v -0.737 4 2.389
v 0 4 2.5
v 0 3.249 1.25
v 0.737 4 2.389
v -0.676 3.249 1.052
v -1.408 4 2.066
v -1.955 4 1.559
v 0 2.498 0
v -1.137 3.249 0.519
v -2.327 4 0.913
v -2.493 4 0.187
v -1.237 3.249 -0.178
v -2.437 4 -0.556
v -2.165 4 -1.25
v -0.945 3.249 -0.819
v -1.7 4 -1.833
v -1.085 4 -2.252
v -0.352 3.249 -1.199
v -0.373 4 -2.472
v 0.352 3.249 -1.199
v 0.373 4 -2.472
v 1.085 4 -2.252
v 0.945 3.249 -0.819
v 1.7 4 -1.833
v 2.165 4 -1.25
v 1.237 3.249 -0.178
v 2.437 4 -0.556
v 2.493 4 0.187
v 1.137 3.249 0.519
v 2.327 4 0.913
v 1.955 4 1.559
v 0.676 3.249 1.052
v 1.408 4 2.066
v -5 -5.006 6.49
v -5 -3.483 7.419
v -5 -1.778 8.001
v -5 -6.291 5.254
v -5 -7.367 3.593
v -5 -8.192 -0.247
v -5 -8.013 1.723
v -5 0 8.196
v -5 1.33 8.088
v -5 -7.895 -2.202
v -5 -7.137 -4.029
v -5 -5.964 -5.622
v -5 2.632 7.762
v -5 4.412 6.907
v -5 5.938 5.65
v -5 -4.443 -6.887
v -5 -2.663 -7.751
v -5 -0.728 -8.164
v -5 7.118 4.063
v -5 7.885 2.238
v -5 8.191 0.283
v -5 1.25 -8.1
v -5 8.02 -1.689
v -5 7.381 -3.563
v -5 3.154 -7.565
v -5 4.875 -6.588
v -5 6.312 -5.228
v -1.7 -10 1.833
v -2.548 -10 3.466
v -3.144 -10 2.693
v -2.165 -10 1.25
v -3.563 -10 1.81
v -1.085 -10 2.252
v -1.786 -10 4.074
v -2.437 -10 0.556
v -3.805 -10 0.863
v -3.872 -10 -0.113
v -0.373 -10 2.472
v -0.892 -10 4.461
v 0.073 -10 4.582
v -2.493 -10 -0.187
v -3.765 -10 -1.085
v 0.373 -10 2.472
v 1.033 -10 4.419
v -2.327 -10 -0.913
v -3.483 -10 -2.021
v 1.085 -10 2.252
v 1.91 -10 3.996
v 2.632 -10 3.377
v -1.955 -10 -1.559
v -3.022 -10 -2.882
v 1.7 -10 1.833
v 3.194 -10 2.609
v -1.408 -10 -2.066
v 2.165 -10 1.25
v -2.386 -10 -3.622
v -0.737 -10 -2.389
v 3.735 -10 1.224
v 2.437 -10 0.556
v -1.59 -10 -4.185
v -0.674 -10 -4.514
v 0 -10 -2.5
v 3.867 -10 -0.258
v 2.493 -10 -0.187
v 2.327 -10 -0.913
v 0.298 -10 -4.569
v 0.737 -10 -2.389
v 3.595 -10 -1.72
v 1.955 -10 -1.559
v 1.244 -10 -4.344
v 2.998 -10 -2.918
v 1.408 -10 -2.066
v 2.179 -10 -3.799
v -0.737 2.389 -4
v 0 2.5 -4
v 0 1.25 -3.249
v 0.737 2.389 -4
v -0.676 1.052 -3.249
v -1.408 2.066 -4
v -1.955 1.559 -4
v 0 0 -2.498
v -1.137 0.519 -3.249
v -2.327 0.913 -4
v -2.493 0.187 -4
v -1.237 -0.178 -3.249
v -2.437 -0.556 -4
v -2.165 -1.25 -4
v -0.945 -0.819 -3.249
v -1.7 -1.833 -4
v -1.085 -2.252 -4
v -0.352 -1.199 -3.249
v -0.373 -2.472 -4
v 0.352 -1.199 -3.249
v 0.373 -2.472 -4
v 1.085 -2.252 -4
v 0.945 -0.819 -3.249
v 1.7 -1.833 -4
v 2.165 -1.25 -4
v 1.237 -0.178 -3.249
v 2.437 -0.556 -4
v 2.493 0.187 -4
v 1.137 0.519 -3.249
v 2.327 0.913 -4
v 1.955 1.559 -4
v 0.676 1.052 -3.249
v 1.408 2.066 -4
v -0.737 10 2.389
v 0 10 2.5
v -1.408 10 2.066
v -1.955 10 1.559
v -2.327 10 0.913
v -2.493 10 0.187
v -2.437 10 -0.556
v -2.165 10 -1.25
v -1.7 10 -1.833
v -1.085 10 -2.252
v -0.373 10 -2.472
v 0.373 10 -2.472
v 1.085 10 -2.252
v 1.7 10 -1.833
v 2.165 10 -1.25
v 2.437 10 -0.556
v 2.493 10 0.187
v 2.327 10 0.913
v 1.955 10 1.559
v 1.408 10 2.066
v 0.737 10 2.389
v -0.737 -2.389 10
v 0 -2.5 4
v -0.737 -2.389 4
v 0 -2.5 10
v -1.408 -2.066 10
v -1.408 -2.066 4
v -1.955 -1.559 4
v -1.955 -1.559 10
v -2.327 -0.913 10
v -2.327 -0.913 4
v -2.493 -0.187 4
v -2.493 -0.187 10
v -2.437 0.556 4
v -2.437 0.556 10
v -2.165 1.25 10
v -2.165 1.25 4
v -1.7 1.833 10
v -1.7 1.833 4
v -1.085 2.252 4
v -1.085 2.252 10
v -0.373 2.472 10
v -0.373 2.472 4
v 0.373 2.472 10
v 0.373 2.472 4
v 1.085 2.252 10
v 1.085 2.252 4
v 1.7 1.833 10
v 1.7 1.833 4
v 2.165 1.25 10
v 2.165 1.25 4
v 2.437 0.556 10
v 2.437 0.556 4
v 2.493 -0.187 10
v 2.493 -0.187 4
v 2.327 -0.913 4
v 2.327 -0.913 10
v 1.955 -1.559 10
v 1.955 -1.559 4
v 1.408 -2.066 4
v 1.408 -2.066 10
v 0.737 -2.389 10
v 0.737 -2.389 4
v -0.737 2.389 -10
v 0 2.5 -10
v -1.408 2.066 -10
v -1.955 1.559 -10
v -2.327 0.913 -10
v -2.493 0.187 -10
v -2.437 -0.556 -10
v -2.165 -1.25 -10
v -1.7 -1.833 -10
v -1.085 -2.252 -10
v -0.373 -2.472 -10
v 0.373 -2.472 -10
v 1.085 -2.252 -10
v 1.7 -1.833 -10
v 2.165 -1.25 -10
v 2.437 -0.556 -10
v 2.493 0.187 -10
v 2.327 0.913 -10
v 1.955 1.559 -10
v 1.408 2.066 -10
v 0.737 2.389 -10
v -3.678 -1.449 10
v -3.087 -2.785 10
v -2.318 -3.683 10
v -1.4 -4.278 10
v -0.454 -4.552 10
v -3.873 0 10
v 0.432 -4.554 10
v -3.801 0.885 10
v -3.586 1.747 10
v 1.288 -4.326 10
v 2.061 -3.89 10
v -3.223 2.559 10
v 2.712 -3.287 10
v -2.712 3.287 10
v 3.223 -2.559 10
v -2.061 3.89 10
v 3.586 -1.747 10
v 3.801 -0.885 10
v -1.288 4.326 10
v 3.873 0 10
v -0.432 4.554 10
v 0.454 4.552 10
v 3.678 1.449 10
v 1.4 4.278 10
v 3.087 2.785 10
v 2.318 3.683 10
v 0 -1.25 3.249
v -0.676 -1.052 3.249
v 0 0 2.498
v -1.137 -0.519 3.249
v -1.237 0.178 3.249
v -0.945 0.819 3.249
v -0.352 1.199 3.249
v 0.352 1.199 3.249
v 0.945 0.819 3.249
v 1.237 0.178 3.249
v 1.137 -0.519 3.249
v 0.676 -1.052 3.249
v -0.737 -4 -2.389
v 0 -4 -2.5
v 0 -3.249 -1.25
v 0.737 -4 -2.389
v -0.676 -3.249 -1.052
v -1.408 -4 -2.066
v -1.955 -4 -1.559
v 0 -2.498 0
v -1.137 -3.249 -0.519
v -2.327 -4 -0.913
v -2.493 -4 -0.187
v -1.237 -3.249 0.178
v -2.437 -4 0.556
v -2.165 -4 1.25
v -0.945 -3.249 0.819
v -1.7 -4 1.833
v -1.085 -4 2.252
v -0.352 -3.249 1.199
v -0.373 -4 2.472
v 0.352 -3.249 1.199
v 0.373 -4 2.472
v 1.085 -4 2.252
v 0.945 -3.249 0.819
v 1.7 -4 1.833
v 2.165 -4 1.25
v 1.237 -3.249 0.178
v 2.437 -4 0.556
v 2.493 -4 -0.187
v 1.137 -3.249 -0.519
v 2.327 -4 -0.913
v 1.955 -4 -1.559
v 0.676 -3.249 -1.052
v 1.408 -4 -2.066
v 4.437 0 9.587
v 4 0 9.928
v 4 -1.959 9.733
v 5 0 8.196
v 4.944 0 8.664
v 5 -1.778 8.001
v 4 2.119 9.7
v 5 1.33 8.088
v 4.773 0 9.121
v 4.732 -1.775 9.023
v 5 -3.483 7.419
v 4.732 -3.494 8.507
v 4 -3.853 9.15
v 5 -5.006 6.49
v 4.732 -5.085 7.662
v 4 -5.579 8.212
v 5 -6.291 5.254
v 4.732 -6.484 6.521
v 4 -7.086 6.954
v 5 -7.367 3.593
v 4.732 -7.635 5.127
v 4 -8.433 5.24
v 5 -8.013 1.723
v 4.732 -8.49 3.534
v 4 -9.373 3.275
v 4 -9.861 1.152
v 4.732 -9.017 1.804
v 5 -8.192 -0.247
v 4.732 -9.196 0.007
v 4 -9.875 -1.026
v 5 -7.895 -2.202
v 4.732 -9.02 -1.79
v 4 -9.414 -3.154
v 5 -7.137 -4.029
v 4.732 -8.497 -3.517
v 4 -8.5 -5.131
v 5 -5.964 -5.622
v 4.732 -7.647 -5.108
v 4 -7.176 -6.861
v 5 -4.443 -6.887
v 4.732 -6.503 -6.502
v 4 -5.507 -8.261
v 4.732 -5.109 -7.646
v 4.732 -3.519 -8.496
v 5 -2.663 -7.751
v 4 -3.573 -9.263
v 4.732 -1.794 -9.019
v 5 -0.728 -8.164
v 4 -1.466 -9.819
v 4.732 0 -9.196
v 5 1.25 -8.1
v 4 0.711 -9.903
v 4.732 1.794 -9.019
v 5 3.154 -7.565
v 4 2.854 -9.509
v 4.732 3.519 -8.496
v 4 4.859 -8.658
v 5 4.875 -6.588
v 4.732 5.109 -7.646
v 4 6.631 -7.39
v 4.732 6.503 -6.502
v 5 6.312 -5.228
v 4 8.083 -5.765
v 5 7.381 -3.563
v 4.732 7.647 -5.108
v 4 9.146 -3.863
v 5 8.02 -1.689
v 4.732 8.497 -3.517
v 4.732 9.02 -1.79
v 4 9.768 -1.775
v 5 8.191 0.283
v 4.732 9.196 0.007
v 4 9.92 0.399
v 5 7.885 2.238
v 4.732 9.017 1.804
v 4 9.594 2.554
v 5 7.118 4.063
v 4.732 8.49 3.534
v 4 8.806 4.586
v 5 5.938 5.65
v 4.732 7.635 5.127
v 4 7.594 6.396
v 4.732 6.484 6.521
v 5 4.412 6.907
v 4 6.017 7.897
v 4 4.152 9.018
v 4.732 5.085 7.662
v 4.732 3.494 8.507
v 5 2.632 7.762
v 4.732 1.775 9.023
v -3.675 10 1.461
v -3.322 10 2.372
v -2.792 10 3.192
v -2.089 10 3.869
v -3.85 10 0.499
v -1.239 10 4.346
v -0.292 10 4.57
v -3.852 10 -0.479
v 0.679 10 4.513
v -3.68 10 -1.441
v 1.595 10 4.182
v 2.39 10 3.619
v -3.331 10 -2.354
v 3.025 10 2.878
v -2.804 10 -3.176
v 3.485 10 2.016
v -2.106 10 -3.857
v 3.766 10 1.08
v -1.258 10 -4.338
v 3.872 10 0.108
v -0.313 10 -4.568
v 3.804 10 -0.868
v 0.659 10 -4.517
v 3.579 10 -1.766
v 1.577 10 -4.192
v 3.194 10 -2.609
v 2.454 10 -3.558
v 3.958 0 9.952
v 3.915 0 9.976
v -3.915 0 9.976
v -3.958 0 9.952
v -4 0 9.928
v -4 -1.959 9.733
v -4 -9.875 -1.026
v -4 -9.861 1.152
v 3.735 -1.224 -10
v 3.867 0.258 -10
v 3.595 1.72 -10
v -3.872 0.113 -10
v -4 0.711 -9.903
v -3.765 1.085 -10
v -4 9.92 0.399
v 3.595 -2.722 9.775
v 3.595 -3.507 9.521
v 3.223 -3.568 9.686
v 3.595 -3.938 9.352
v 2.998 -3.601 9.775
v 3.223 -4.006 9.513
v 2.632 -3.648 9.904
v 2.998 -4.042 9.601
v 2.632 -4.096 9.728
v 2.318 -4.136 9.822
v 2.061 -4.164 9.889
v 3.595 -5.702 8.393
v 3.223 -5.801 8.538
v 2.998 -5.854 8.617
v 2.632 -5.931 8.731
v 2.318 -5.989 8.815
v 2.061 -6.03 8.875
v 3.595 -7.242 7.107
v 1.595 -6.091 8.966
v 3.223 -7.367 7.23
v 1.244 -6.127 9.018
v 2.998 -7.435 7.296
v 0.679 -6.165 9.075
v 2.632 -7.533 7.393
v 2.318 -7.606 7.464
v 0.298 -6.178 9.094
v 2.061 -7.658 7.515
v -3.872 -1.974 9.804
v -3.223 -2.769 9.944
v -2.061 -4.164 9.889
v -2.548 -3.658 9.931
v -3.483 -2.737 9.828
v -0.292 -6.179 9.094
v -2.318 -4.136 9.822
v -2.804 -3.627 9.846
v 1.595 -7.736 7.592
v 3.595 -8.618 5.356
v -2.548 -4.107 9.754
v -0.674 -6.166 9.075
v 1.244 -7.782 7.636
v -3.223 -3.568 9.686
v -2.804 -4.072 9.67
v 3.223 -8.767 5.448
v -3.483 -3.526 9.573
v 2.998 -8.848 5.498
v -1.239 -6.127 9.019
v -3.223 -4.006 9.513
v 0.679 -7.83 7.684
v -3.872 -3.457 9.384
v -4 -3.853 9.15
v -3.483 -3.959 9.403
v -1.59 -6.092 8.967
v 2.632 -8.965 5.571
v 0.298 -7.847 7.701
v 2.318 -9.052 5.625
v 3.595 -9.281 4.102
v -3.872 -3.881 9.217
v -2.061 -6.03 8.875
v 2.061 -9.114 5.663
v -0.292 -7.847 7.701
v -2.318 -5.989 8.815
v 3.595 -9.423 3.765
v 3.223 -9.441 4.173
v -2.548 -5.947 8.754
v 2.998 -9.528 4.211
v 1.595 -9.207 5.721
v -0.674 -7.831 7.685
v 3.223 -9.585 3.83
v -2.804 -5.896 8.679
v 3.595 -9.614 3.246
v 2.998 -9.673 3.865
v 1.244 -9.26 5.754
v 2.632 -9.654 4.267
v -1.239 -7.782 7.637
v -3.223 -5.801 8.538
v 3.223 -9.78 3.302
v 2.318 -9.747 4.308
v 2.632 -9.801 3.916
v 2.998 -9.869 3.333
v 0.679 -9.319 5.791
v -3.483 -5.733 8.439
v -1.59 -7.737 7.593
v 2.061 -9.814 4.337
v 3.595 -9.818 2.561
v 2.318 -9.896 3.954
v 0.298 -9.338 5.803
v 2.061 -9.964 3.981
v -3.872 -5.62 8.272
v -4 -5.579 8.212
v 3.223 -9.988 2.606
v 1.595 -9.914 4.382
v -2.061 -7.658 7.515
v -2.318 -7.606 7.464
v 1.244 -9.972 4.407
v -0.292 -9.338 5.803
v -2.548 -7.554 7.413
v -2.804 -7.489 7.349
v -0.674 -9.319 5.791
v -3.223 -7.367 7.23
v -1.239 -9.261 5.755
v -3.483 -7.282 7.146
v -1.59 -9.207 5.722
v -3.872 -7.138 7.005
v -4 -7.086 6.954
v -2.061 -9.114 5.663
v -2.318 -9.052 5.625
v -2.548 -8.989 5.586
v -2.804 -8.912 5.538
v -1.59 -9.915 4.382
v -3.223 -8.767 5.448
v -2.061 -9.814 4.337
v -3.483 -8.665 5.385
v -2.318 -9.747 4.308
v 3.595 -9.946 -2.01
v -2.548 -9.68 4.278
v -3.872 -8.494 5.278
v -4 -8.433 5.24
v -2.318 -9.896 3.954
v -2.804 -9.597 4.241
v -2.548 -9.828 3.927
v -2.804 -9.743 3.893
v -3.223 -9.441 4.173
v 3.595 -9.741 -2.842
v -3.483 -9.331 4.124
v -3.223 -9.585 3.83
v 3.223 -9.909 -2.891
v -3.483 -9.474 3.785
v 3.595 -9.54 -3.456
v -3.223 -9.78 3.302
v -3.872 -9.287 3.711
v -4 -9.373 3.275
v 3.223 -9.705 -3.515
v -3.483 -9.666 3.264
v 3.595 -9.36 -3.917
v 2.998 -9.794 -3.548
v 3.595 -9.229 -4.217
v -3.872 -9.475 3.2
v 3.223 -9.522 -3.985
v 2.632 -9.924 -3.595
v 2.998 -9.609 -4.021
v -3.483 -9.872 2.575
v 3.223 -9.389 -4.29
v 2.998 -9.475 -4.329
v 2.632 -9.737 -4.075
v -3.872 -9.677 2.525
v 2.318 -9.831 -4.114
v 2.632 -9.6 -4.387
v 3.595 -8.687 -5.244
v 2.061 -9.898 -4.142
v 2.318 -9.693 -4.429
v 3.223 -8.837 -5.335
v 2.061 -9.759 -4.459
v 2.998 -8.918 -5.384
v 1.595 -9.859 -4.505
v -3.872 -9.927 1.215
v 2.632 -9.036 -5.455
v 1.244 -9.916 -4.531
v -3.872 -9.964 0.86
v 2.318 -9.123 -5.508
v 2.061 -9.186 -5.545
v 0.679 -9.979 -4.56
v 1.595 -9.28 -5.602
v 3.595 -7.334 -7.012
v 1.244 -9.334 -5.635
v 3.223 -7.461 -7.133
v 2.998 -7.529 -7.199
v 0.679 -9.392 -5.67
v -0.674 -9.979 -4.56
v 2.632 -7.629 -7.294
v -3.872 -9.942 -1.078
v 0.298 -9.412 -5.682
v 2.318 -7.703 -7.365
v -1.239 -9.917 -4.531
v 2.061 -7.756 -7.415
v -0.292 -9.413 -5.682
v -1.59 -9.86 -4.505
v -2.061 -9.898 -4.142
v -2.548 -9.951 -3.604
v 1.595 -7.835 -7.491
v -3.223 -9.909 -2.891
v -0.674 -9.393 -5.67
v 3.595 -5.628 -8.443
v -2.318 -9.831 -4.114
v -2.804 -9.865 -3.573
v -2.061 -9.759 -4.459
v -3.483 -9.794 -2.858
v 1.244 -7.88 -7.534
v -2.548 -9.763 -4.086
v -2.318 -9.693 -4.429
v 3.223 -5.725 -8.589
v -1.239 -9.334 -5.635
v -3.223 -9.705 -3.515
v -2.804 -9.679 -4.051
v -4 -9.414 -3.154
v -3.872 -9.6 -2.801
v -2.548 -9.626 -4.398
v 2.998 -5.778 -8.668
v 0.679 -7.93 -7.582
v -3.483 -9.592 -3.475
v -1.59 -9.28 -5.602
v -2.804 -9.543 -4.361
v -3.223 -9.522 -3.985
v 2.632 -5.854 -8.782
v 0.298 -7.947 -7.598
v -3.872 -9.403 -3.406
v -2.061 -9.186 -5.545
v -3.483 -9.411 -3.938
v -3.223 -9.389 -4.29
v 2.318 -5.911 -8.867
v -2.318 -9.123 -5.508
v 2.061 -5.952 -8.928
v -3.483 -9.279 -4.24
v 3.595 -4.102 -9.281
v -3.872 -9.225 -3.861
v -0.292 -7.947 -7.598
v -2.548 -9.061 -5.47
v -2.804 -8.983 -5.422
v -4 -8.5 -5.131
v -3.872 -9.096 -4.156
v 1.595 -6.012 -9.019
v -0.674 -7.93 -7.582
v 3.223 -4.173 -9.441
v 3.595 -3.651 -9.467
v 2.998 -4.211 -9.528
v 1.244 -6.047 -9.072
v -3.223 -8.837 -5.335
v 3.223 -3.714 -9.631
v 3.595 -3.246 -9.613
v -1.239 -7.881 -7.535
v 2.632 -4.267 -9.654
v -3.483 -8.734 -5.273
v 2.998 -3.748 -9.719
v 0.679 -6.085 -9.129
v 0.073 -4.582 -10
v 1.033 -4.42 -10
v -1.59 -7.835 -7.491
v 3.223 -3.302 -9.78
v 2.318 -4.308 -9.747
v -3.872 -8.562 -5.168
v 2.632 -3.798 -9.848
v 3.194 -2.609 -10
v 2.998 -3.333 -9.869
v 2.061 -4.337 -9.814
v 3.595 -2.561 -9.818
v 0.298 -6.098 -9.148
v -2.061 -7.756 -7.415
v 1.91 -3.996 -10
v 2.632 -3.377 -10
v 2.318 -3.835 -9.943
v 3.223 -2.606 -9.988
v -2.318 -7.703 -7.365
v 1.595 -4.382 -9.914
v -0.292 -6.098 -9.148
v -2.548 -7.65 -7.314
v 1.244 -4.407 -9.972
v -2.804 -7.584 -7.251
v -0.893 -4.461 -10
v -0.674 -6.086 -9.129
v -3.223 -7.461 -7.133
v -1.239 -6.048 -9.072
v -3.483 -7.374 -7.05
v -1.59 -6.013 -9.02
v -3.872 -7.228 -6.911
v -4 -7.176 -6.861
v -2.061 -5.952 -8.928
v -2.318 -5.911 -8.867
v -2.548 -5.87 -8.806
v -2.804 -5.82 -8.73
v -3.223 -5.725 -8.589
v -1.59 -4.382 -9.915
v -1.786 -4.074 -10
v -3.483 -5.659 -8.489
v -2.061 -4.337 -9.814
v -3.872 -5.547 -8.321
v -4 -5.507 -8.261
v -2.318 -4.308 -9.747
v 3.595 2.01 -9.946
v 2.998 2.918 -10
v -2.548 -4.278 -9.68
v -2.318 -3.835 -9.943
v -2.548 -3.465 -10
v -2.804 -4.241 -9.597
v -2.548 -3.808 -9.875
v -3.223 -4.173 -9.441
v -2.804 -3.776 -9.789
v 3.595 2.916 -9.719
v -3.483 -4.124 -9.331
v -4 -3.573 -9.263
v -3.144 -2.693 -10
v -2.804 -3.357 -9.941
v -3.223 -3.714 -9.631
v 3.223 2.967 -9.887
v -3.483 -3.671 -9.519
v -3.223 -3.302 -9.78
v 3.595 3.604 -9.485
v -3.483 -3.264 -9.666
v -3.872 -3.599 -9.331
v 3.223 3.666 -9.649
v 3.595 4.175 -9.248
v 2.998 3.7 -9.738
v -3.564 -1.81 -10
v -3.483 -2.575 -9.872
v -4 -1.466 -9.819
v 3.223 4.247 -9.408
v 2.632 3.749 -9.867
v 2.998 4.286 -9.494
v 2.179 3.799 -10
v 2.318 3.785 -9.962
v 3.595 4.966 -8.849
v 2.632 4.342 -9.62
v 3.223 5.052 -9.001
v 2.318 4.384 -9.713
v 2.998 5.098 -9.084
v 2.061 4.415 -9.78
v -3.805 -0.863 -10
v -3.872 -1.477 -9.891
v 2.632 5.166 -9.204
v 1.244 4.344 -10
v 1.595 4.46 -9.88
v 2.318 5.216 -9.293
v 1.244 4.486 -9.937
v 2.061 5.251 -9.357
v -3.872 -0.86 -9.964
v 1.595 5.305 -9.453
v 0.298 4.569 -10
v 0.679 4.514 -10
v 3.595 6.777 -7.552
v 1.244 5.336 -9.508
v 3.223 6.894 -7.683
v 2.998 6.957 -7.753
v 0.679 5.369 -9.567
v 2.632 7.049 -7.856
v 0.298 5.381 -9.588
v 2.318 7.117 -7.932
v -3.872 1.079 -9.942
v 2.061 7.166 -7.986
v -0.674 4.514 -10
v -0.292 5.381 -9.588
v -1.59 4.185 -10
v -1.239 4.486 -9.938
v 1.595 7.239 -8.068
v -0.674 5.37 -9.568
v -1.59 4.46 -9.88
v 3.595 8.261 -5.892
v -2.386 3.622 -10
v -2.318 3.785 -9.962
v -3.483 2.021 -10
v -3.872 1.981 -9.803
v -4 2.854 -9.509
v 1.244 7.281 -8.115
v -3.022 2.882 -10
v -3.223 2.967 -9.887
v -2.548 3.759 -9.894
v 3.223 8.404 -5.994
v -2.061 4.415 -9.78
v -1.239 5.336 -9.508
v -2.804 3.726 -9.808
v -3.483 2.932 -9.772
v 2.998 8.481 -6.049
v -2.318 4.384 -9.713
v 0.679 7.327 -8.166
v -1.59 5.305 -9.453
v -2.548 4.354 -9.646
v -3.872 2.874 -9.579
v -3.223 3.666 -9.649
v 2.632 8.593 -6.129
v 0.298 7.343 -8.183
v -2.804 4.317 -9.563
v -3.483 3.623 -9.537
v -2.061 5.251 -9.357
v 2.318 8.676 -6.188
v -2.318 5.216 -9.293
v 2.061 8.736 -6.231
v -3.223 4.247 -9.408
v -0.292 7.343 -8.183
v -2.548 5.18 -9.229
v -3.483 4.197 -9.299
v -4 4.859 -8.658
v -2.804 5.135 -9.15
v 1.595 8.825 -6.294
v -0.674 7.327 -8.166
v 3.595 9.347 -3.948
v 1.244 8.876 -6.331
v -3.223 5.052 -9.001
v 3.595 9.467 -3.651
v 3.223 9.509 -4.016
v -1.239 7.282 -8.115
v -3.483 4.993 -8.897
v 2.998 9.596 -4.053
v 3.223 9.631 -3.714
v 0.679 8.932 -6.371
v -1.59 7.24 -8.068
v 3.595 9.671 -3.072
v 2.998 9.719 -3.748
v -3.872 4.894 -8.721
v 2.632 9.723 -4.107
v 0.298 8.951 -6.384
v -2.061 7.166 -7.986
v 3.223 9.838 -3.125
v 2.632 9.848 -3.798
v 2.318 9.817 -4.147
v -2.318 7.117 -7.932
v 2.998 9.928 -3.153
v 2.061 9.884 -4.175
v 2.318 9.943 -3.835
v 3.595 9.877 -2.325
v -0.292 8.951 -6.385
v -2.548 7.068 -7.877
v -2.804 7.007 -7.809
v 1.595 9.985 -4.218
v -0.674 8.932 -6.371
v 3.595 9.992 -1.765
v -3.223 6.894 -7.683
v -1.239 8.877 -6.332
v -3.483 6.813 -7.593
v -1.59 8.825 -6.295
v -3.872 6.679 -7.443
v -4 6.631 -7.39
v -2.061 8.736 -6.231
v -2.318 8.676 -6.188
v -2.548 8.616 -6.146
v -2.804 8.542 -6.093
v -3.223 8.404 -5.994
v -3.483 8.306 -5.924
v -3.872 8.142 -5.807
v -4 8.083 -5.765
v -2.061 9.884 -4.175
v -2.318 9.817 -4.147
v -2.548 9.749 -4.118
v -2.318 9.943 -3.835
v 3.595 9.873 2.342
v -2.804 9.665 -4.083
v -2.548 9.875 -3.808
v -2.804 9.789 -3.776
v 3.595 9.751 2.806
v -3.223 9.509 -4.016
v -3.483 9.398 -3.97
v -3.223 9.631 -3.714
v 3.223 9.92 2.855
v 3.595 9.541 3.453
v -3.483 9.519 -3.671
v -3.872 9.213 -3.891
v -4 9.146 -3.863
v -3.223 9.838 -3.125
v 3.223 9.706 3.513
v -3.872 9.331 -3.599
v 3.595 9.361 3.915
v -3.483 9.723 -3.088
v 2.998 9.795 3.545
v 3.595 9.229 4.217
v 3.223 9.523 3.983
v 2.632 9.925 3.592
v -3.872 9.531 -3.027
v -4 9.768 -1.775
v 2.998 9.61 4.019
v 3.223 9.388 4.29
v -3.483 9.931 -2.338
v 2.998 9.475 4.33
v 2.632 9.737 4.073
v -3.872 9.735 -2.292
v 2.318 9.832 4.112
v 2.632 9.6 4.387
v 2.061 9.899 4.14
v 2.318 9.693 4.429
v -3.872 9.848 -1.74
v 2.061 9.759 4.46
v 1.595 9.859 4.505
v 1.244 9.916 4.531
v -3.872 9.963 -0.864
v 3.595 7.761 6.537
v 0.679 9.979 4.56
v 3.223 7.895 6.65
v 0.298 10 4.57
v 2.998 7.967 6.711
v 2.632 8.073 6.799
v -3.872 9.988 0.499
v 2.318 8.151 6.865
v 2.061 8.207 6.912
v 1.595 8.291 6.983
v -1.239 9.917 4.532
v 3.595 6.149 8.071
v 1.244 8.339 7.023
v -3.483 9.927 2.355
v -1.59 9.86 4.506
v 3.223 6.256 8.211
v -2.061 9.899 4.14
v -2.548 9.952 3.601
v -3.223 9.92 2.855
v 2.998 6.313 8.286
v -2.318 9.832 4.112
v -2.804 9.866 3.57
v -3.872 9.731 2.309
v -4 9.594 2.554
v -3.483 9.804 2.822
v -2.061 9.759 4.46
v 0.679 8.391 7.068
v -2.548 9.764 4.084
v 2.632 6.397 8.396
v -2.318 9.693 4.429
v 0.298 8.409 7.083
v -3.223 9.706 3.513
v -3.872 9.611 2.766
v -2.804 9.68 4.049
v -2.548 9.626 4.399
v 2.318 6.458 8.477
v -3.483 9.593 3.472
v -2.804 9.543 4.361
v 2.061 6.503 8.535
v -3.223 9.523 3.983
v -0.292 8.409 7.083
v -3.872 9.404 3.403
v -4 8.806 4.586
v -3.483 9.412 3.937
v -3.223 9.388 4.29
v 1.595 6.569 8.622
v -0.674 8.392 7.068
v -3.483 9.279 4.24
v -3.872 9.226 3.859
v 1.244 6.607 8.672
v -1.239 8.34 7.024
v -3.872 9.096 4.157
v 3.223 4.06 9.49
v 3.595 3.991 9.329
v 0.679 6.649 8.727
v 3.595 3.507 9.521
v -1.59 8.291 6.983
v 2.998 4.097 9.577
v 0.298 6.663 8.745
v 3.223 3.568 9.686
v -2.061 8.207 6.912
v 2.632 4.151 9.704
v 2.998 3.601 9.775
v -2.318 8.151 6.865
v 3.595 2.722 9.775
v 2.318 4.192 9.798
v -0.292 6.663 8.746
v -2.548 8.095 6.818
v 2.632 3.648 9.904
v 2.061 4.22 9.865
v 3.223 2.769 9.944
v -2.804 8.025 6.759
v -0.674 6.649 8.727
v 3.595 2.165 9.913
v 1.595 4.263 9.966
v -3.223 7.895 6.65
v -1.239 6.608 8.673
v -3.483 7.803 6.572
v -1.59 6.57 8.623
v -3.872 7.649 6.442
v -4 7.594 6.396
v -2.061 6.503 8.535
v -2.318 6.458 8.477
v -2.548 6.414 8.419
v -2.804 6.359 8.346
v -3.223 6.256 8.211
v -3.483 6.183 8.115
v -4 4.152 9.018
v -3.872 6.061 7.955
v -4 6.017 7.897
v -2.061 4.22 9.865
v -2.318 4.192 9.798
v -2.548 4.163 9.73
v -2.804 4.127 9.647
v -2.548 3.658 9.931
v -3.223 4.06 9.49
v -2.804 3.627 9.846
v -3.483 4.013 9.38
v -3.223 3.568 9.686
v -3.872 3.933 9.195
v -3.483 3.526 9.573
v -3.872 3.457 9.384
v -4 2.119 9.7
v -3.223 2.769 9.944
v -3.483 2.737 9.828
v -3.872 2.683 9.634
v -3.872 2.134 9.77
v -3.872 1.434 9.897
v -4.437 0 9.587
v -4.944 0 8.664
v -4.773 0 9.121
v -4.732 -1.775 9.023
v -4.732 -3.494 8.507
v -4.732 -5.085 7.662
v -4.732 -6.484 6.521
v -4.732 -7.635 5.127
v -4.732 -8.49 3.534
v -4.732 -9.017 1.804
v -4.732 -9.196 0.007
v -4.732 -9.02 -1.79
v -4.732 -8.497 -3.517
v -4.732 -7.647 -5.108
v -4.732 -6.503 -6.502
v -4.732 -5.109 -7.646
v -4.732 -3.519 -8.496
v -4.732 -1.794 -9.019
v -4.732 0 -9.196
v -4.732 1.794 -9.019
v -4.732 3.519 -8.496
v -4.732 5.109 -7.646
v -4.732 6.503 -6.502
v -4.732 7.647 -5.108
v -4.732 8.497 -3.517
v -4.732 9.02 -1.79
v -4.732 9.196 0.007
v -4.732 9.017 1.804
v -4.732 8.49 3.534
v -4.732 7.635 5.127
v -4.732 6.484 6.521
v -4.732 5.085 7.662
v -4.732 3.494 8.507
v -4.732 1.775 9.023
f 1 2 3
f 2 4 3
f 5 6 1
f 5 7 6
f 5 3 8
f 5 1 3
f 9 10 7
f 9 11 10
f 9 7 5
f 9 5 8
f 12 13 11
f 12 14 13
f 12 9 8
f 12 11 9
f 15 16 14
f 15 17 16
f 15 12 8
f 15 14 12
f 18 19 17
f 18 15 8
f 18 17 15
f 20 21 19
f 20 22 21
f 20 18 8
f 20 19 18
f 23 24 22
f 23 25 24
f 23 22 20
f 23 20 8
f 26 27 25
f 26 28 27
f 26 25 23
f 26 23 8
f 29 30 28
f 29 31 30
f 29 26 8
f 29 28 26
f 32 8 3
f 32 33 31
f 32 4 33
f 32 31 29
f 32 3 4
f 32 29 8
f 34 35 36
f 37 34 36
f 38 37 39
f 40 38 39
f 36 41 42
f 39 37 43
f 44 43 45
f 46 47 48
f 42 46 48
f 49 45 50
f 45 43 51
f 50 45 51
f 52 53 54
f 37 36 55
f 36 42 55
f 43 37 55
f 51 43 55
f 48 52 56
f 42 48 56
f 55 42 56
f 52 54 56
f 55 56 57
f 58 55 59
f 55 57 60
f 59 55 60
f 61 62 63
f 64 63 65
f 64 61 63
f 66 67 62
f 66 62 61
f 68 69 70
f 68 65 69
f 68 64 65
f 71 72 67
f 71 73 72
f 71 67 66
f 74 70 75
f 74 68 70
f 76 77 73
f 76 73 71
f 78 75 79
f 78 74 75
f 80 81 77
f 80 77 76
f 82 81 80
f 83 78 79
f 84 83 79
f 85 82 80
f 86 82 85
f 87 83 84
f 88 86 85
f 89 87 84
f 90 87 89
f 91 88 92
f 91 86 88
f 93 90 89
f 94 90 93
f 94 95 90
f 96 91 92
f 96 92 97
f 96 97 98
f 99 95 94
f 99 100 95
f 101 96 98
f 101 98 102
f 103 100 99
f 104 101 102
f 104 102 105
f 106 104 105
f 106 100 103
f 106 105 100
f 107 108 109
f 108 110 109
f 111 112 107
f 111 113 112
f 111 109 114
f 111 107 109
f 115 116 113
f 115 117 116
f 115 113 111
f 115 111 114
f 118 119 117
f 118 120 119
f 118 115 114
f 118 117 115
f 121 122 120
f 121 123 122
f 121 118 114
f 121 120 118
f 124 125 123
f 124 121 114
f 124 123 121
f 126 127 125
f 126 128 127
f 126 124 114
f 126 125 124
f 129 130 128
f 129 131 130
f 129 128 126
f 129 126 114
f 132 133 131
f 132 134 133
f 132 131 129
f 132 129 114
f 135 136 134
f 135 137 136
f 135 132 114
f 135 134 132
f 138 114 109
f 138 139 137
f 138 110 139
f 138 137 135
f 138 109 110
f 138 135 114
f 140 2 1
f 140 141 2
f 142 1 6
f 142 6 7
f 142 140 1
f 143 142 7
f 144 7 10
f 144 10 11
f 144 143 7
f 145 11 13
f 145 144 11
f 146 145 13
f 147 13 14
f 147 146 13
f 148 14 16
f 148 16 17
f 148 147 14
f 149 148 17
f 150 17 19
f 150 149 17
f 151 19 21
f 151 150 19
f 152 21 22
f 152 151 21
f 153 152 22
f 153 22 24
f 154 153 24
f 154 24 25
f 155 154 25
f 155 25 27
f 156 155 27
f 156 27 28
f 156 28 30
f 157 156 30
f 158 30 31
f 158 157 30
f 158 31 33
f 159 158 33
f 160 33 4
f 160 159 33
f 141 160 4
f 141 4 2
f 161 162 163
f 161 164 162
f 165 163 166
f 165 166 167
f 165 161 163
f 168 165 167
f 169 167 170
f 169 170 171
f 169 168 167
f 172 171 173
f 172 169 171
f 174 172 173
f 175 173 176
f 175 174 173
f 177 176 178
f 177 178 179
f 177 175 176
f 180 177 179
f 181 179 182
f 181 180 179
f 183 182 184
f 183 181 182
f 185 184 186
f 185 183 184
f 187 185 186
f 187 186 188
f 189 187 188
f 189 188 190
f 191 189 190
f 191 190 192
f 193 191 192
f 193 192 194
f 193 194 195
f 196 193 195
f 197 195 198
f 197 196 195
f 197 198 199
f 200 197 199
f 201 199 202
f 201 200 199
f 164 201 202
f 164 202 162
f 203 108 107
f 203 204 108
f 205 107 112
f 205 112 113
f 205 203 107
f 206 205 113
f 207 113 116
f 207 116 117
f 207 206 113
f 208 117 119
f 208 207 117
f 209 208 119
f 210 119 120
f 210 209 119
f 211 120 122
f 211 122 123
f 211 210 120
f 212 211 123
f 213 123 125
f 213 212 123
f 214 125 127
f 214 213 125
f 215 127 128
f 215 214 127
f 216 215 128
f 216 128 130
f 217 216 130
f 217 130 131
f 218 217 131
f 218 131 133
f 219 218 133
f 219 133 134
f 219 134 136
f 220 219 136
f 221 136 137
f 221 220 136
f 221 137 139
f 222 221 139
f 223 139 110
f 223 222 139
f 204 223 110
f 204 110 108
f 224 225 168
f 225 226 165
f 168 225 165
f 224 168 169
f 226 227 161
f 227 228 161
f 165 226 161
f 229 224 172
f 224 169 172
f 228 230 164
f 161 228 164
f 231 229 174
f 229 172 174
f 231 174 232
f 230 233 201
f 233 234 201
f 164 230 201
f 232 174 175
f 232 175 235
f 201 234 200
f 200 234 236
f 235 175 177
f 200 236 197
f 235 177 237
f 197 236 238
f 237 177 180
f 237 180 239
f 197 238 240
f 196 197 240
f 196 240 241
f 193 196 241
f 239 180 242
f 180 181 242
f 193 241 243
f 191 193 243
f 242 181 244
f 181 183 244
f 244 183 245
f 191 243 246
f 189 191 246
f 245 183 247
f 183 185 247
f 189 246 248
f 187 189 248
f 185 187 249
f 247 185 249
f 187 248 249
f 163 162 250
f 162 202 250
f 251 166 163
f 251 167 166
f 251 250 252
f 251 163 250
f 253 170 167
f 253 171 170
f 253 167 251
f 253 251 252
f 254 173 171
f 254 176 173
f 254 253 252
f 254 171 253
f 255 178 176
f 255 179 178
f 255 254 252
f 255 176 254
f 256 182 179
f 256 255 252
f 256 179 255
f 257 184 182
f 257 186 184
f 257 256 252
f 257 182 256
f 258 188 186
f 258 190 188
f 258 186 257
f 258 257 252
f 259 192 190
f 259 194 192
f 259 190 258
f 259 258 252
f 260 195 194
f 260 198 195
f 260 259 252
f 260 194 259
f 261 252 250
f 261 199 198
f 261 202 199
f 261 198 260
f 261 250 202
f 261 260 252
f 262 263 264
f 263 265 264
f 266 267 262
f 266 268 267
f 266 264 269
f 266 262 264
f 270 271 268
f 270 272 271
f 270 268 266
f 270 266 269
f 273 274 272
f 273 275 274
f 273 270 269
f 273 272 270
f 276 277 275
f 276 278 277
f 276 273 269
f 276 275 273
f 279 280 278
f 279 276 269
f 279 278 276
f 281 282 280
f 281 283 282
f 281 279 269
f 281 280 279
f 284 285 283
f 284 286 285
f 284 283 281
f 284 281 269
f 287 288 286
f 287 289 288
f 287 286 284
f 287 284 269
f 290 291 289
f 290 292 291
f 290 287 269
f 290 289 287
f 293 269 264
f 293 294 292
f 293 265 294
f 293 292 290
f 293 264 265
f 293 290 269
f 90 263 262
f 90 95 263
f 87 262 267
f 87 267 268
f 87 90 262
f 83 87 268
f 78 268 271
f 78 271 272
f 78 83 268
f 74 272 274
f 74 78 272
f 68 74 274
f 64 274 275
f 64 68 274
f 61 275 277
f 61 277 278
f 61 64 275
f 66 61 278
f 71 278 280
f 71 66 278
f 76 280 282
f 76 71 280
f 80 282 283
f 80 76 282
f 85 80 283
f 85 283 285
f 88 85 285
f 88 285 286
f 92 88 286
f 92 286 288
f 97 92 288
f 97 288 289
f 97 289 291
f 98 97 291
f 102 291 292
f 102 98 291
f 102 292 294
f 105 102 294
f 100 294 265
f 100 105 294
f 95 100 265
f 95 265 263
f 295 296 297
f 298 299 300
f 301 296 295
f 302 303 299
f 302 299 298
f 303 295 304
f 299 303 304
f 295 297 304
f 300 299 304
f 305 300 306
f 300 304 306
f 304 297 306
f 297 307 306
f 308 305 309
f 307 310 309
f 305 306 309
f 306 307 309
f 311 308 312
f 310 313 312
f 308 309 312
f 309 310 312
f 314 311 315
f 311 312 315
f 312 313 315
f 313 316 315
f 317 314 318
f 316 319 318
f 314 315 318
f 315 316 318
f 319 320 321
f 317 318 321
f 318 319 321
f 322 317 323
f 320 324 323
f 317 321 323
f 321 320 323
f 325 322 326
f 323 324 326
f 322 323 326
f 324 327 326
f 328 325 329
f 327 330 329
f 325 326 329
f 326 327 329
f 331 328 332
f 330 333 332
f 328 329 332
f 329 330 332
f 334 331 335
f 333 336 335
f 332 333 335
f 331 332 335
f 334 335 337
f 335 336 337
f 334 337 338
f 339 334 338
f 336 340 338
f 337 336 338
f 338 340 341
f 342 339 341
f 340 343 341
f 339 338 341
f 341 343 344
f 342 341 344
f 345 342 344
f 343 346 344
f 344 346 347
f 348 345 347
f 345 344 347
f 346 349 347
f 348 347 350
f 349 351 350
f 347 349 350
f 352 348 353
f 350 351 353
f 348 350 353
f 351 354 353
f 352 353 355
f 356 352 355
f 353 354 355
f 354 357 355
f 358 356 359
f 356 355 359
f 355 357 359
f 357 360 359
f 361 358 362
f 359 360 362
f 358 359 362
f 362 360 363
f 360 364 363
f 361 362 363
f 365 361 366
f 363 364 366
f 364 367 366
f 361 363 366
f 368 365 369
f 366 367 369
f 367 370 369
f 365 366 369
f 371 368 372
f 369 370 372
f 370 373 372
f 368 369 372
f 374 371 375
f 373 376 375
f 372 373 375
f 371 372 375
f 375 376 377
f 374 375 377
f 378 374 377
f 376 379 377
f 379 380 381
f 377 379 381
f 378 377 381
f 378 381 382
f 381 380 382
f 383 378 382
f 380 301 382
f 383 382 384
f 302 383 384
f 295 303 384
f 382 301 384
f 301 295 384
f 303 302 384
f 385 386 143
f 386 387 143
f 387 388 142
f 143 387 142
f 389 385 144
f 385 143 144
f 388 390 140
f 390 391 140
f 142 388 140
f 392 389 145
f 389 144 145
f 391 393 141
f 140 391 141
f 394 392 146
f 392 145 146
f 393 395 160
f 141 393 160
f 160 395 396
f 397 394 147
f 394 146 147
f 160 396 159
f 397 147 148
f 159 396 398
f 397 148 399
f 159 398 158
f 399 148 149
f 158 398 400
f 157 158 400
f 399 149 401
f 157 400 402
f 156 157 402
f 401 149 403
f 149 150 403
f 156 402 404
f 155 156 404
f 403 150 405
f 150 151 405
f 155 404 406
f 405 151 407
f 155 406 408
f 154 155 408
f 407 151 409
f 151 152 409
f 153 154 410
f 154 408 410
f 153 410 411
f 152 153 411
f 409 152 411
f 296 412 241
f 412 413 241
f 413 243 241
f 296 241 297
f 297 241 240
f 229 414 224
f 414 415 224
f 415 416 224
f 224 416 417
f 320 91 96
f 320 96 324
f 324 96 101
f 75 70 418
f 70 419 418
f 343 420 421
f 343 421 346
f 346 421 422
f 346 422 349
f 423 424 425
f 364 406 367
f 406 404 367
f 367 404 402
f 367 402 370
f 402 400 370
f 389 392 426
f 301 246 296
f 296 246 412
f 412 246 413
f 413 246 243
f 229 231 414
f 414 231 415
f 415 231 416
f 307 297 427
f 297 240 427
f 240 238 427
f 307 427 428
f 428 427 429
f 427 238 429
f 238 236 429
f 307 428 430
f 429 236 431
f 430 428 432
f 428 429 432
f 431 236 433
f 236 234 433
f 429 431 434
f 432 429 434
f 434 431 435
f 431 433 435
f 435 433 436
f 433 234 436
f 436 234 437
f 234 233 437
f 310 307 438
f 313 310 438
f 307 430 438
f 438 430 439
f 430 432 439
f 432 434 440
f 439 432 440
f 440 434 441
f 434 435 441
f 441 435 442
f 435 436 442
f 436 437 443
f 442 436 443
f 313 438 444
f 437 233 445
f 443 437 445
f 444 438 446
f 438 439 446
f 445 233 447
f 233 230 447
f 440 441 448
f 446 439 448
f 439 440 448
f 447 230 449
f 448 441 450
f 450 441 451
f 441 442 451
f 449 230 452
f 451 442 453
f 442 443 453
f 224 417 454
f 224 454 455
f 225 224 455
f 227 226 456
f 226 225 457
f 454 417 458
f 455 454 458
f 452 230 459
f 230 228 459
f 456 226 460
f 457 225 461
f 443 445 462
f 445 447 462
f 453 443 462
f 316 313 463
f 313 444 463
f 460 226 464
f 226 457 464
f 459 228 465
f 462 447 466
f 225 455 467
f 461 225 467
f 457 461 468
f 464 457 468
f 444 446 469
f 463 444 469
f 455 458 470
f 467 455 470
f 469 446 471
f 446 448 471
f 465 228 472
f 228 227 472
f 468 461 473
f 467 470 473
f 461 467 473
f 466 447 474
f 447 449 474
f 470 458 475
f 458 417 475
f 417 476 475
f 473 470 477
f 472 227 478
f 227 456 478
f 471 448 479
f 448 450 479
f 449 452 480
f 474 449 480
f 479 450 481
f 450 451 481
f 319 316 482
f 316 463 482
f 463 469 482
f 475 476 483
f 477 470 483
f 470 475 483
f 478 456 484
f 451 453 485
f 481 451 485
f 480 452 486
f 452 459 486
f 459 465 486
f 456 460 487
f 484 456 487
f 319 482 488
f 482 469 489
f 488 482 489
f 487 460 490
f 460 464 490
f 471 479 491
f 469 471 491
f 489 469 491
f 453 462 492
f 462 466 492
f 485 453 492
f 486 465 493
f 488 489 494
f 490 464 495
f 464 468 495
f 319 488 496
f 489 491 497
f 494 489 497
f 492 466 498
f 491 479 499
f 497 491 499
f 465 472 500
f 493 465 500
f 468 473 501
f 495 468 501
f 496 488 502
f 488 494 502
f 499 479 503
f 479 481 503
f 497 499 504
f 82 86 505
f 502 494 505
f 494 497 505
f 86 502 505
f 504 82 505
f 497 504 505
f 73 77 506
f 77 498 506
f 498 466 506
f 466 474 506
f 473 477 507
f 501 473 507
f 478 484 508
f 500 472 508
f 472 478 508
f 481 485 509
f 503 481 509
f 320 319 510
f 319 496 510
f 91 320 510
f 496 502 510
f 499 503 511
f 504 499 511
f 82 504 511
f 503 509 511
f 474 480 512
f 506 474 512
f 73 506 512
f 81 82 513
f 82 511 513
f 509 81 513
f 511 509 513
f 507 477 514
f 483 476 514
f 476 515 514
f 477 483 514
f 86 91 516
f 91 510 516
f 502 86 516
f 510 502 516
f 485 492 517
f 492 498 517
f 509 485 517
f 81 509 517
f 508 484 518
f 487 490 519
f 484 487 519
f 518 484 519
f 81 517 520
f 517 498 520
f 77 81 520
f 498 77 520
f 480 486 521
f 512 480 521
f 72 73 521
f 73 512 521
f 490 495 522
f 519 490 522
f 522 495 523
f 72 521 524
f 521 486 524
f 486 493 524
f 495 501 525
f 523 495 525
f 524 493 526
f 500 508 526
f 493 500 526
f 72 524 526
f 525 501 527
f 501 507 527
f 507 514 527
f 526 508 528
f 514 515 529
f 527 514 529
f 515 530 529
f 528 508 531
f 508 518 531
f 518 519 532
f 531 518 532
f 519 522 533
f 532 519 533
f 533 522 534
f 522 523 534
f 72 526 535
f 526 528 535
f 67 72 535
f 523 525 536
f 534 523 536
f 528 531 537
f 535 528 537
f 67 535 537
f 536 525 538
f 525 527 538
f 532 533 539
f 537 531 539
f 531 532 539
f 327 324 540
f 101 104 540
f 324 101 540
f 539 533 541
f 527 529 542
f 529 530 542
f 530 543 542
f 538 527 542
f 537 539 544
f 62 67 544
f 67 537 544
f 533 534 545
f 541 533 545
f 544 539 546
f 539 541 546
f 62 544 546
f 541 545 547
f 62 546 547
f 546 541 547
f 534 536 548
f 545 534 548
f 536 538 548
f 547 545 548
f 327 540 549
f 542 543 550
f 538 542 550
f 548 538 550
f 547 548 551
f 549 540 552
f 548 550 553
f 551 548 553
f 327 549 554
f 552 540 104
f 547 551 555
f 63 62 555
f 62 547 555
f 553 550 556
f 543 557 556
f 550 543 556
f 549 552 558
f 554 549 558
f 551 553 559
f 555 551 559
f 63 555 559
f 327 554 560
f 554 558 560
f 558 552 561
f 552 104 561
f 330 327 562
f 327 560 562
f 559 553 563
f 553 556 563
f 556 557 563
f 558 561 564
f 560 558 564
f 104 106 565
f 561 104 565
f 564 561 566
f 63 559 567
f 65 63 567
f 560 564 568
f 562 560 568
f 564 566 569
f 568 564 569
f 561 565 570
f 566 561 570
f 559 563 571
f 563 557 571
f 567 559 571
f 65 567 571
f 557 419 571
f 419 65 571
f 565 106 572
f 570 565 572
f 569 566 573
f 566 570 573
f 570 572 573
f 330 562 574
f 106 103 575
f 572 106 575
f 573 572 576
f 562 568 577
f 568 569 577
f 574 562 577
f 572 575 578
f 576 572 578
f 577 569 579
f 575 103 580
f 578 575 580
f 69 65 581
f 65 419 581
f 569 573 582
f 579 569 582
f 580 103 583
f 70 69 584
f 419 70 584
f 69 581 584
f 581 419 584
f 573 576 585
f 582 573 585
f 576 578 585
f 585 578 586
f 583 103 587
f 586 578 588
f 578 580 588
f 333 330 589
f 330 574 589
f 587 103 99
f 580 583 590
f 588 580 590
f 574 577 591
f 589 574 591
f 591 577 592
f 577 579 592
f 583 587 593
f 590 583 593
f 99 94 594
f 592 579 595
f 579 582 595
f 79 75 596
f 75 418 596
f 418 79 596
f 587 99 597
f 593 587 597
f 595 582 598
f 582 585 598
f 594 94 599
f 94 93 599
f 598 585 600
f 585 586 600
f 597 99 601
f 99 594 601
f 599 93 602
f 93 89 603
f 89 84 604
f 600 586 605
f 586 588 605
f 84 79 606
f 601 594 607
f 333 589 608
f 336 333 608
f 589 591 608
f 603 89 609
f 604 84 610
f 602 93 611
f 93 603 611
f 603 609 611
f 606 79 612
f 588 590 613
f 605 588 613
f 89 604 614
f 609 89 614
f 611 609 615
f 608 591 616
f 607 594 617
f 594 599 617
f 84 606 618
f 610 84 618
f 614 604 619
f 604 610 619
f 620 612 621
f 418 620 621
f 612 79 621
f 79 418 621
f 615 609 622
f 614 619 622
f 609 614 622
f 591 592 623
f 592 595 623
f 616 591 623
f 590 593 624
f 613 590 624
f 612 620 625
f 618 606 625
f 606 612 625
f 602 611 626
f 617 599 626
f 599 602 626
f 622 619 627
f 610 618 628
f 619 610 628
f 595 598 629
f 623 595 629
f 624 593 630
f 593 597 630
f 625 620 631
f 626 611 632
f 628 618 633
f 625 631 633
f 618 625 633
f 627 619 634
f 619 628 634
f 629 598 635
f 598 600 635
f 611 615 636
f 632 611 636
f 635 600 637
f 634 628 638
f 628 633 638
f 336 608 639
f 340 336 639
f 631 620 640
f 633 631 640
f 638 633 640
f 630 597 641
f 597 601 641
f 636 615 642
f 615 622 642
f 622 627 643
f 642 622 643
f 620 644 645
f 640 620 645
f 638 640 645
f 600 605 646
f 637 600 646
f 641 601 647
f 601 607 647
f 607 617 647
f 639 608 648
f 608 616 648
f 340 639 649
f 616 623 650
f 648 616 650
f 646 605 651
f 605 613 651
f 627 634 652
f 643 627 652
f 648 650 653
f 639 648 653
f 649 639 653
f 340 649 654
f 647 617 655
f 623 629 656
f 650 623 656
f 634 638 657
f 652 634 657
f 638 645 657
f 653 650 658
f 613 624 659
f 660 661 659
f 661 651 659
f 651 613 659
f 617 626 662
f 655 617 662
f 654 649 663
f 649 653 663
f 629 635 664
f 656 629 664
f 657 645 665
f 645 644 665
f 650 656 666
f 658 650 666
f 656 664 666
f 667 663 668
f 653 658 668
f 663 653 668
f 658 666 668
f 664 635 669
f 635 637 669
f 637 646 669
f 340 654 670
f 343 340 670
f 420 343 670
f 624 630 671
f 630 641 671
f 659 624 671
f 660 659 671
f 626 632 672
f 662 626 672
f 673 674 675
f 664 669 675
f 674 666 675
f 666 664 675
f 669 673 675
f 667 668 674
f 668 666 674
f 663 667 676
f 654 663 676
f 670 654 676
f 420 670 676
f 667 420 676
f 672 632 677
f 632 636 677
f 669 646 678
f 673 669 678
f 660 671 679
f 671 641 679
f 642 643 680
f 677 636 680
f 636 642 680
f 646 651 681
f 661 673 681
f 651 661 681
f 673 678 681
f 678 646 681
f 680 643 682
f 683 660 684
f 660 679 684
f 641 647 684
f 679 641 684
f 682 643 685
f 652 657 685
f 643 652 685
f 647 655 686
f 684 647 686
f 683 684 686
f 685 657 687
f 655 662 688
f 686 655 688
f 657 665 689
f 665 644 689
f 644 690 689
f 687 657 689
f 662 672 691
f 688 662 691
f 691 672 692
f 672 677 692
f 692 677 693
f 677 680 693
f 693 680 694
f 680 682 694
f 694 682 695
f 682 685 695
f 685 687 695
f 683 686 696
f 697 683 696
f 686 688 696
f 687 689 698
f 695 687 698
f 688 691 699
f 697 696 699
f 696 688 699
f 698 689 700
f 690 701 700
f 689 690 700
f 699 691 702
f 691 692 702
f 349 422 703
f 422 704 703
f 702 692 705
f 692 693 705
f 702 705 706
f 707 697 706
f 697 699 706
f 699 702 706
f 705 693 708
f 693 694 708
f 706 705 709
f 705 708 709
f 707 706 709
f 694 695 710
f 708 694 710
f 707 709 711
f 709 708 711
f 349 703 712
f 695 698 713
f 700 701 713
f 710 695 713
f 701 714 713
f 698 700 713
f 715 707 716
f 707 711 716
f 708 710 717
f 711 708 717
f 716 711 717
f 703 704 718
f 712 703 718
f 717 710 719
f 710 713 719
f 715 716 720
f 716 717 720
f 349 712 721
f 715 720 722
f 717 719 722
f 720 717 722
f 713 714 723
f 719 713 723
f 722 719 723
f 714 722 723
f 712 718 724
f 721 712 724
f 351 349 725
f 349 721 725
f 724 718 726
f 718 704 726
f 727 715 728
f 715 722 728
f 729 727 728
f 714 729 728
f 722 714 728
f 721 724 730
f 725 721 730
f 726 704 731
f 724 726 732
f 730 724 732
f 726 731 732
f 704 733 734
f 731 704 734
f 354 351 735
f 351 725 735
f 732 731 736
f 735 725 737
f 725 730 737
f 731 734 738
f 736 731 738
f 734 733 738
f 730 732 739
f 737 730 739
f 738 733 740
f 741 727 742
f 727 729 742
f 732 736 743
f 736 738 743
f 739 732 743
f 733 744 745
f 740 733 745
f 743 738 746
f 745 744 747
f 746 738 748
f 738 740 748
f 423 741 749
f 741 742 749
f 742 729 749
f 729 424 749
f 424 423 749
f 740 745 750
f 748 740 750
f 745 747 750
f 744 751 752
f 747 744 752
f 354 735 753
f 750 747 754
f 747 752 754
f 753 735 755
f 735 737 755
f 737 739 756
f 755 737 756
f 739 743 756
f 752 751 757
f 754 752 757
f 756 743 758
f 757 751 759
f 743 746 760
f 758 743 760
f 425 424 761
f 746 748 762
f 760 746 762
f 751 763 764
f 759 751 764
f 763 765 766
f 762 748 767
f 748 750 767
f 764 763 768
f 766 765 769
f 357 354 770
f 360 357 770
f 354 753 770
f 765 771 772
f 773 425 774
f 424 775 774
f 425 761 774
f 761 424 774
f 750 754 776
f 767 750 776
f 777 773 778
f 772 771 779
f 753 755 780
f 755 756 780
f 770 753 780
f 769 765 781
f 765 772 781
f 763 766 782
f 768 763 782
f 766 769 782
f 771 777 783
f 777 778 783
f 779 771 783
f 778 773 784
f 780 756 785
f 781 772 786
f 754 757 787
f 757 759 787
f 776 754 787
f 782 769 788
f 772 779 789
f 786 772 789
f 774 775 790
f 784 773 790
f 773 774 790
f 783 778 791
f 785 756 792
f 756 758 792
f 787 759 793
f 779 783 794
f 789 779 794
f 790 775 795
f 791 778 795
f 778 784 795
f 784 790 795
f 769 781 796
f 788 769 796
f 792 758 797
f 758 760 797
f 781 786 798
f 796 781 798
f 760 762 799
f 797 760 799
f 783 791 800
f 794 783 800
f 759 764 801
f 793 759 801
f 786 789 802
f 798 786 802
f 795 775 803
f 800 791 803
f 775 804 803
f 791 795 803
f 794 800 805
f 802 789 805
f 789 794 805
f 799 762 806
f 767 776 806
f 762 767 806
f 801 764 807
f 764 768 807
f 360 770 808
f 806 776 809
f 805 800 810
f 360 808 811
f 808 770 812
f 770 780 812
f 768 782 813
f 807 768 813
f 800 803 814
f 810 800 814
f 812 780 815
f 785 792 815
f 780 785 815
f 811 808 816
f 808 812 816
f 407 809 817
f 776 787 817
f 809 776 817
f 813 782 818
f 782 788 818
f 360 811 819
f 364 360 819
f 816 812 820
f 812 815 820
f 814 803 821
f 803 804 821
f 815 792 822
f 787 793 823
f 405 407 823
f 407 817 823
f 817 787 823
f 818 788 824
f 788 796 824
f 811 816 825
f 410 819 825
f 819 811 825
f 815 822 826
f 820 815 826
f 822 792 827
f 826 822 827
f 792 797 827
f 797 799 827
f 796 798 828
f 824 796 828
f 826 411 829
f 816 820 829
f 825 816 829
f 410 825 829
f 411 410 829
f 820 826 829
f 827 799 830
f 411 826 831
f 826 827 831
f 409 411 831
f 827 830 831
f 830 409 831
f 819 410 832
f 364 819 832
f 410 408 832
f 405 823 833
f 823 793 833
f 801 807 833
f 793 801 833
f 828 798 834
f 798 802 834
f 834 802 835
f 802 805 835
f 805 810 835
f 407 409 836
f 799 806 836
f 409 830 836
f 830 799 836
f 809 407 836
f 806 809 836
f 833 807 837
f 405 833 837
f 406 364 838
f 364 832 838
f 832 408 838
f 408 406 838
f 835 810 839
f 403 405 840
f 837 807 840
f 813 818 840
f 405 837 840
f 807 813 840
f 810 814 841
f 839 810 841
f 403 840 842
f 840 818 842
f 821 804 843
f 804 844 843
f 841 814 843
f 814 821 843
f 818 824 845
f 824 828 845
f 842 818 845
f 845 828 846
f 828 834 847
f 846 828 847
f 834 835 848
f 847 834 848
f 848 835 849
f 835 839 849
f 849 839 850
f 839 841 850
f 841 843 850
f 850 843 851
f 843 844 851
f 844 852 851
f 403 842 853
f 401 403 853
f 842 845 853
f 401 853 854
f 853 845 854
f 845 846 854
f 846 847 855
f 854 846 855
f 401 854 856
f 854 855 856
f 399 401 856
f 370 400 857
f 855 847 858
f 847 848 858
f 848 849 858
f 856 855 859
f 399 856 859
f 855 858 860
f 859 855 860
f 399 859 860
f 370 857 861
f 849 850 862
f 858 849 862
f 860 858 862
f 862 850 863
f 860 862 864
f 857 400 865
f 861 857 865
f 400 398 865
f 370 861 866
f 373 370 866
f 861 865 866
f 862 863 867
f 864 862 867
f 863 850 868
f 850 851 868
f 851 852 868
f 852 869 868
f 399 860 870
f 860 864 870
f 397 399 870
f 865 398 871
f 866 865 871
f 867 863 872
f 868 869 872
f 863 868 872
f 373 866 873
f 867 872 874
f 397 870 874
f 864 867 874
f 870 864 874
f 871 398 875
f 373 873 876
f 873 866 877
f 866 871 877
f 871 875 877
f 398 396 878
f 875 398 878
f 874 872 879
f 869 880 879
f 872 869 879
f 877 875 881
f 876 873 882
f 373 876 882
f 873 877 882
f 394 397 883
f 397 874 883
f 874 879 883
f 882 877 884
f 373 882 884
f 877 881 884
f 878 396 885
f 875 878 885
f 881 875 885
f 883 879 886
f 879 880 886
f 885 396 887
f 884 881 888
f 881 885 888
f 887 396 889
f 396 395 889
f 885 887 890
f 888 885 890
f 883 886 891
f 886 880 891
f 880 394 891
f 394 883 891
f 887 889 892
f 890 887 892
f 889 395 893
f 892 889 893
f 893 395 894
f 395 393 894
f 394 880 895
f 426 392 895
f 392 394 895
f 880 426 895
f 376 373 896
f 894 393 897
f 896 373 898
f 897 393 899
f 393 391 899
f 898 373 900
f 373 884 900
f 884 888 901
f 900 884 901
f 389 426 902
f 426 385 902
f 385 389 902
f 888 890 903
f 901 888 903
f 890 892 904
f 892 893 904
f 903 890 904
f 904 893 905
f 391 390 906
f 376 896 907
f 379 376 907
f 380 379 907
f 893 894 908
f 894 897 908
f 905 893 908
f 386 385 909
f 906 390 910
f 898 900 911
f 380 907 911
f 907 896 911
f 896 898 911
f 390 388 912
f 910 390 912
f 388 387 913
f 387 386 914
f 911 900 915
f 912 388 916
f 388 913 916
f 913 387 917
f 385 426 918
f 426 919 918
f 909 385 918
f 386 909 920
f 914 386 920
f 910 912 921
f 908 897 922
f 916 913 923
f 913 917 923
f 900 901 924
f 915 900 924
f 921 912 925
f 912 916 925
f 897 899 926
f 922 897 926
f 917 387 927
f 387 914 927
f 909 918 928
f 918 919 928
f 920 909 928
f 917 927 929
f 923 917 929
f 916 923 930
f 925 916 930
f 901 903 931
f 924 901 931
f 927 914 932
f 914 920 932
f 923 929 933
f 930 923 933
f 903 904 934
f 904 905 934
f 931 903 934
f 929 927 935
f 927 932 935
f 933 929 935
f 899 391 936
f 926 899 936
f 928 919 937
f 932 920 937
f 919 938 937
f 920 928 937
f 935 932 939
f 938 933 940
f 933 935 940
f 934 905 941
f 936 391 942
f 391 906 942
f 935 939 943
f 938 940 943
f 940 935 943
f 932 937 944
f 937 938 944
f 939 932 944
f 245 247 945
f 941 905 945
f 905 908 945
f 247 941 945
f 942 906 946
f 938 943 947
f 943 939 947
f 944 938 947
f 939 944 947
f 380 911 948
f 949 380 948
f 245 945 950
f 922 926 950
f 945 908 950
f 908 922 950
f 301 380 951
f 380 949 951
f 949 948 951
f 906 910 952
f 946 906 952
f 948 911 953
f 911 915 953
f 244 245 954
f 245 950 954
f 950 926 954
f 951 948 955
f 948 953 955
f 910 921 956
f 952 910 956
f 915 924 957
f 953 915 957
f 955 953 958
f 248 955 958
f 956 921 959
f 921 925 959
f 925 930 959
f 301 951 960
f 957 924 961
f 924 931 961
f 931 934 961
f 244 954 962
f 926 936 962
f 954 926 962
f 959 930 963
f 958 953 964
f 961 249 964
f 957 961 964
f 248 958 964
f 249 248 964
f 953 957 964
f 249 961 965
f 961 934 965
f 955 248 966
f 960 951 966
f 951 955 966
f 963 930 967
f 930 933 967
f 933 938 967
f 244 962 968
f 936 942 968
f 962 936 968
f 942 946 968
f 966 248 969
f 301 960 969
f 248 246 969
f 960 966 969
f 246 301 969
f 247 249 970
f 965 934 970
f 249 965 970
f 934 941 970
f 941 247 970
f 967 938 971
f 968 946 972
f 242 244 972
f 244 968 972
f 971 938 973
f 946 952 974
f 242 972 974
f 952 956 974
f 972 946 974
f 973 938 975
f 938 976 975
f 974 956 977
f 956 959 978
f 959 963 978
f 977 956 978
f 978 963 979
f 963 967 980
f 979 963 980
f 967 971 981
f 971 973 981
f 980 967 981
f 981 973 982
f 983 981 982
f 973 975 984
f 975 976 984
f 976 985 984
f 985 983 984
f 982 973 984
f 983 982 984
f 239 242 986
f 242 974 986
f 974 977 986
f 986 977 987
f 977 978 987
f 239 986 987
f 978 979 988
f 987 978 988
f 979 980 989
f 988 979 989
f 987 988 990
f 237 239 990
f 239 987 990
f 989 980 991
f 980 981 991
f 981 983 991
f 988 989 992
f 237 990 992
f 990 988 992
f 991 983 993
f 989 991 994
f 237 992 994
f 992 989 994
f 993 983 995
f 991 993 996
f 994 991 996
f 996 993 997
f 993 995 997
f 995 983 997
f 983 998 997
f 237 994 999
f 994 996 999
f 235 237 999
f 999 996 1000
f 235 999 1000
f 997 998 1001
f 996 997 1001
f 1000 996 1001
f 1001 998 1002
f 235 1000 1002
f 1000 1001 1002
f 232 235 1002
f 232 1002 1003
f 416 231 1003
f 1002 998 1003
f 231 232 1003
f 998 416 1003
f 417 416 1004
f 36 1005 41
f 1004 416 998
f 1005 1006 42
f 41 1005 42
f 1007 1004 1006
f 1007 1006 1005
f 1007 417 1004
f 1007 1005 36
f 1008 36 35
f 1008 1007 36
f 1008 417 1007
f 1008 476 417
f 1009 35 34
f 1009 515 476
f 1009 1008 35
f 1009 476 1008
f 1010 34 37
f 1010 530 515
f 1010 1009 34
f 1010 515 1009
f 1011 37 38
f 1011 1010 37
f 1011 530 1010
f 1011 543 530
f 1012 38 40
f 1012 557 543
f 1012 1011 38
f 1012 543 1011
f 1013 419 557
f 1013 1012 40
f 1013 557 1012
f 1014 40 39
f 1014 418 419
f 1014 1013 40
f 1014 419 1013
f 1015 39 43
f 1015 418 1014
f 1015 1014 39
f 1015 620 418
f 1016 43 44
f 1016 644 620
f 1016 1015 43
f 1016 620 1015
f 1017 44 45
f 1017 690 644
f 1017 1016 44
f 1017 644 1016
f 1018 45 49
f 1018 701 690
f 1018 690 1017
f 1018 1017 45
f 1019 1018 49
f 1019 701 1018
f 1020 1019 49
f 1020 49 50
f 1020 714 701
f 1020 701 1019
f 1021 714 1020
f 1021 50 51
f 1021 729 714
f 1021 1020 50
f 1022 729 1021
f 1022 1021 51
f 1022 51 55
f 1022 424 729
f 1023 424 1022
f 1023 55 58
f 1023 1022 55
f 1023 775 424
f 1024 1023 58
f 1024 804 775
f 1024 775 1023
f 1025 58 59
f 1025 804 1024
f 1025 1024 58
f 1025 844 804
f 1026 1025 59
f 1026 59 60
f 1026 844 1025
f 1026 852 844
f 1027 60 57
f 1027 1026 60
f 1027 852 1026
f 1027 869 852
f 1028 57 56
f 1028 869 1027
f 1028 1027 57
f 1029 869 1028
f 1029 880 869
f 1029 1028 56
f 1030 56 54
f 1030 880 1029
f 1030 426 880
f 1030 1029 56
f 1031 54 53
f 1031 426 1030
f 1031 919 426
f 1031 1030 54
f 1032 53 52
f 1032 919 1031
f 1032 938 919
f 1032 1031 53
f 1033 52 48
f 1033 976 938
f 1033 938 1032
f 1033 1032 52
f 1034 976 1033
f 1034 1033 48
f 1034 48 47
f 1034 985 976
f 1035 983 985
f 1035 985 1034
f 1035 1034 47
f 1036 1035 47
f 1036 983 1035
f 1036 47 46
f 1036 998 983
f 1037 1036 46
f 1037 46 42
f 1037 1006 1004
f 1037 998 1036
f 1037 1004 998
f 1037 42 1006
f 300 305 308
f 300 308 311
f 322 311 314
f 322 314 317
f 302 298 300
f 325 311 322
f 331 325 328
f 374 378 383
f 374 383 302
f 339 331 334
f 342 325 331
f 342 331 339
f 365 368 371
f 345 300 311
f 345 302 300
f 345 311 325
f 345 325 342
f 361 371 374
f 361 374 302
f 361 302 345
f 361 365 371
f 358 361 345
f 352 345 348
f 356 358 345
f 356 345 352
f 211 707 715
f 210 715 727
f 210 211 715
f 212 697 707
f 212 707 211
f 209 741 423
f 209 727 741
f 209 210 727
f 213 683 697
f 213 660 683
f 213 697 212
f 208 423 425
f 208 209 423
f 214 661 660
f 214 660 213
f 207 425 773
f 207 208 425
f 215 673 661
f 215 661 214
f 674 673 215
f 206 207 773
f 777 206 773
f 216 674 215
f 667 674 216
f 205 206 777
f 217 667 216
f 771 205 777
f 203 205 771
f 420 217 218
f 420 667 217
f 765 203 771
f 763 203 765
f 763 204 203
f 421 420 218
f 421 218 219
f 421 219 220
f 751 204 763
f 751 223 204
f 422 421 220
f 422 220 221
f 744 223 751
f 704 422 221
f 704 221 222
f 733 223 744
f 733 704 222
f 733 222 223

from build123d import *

# Parameters (mm, degrees)
SKETCH1_W           = 20
SKETCH1_H           = 20
BOSS_EXTRUDE1_DEPTH = 5
CIRPATTERN1_COUNT   = 4
FILLET1_R           = 2


with BuildPart() as part:
    # Sketch1 → Boss-Extrude1 (new, symmetric)
    with BuildSketch(Plane(origin=(0, 0, 0), x_dir=(0, 0, -1), z_dir=(1, 0, 0))):
        Rectangle(SKETCH1_W, SKETCH1_H)
    extrude(amount=BOSS_EXTRUDE1_DEPTH, both=True)

    # Sketch5 → Cut-Revolve3 (revolve, cut)
    with BuildSketch(Plane(origin=(0, 0, 0), x_dir=(1, 0, 0), z_dir=(0, 0.7071067811865477, 0.7071067811865475)), mode=Mode.PRIVATE) as cut_revolve3_sk:
        with BuildLine():
            Line((-5, 9.244997998), (-5, 18.244997998))
            Line((-5, 18.244997998), (5, 18.244997998))
            Line((5, 18.244997998), (5, 9.244997998))
            ThreePointArc((5, 9.244997998), (0, 11), (-5, 9.244997998))
        make_face()
    revolve(cut_revolve3_sk.sketch.rotate(Axis((-5.750529674, 0, 0), (1, 0, 0)), 135), axis=Axis((-5.750529674, 0, 0), (1, 0, 0)), mode=Mode.SUBTRACT)

    # Sketch8 → Tap Drill for M6 Tap1 (revolve, cut)
    with BuildSketch(Plane(origin=(0, 10, 0), x_dir=(0, 0, 1), z_dir=(1, 0, 0))):
        Polygon((0, 0), (0, 7.502151548), (2.5, 6), (2.5, 0), align=None)
    tap_drill_for_m6_tap1 = revolve(axis=Axis((0, 16.35, 0), (0, -1, 0)), mode=Mode.SUBTRACT)

    # CirPattern1: Tap Drill for M6 Tap1 ×4 about axis
    cirpattern1_axis = Axis((0, 0, 0), (1, 0, 0))
    for i in range(1, CIRPATTERN1_COUNT):
        add(tap_drill_for_m6_tap1.rotate(cirpattern1_axis, i * 360 / CIRPATTERN1_COUNT), mode=Mode.SUBTRACT)

    # Fillet1
    fillet1_edges = [part.edges().sort_by_distance(p)[0] for p in [
        (5, 0, -9.244997998),
        (-5, 0, -9.244997998),
    ]]
    fillet(fillet1_edges, radius=FILLET1_R)


solid = part.part
